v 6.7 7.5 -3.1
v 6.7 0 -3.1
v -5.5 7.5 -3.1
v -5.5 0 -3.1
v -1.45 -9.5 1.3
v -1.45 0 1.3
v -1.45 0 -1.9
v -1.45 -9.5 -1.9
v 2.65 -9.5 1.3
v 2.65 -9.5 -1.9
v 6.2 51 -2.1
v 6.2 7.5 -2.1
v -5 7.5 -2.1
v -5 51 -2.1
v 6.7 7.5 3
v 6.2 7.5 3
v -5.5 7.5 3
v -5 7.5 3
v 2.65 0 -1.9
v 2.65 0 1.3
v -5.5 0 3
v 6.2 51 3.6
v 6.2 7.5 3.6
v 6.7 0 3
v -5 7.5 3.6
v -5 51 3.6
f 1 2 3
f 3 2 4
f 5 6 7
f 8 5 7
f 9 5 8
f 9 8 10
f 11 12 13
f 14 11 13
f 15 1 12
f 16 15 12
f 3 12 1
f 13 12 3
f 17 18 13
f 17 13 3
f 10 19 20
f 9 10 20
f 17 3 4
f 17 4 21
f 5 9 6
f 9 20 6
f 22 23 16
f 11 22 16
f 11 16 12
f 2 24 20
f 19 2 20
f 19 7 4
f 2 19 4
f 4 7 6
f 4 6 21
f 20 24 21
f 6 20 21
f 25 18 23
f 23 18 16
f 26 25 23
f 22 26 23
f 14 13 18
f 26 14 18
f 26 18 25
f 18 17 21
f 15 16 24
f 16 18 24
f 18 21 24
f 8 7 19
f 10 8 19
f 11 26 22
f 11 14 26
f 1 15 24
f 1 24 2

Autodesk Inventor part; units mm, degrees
ref_plane "YZ Plane" through (0, 0, 0) normal (1, 0, 0) x (0, 1, 0)
ref_plane "XZ Plane" through (0, 0, 0) normal (0, 1, 0) x (-1, 0, 0)
ref_plane "XY Plane" through (0, 0, 0) normal (0, 0, 1) x (1, 0, 0)
sketch "Sketch2" plane through (0, 0, 0) normal (0, 1, 0) x (-1, 0, 0)
  line L0 (0, 0) -> (5.5, 0)
  line L1 (5.5, 0) -> (5.5, 3)
  line L2 (5.5, 3) -> (0, 3)
  line L3 (0, 3) -> (0, 0)
  line L4 (5.5, 3) -> (-6.7, 3)
  line L5 (-6.7, 3) -> (-6.7, -3.1)
  line L6 (-6.7, -3.1) -> (5.5, -3.1)
  line L7 (5.5, -3.1) -> (5.5, 3)
  dimension "d0" = 5.5
  dimension "d1" = 3
  dimension "d2" = 12.2
  dimension "d3" = 6.1
extrude "Extrusion1" add sketch "Sketch2" along normal blind 7.5
sketch "Sketch3" plane through (0, 7.5, 0) normal (0, 1, 0) x (1, 0, 0)
  line L0 (6.2, 2.1) -> (-5, 2.1)
  line L1 (-5, 2.1) -> (-5, -3.6)
  line L2 (-5, -3.6) -> (6.2, -3.6)
  line L3 (6.2, -3.6) -> (6.2, 2.1)
  line L4 (6.7, 3.1) -> (-5.5, 3.1) projected
  line L5 (6.7, -3) -> (6.7, 3.1) projected
  point P0 (0, 0)
  dimension "d6" = 6.7
  dimension "d7" = 5.7
  dimension "d8" = 11.2
  dimension "d9" = 0.5
extrude "Extrusion2" add sketch "Sketch3" along normal blind 43.5
sketch "Sketch4" plane through (0, 0, 0) normal (0, -1, 0) x (1, 0, 0)
  line L0 (-1.45, -1.9) -> (2.65, -1.9)
  line L1 (2.65, -1.9) -> (2.65, 1.3)
  line L2 (2.65, 1.3) -> (-1.45, 1.3)
  line L3 (-1.45, 1.3) -> (-1.45, -1.9)
  line L4 (-5.5, 3) -> (6.7, 3) projected
  line L5 (-5.5, -3.1) -> (-5.5, 3) projected
  point P0 (0, 0)
  dimension "d12" = 3.2
  dimension "d13" = 4.1
  dimension "d14" = 1.7
  dimension "d15" = 4.05
extrude "Extrusion3" add sketch "Sketch4" along normal blind 9.5
properties part number "Battery_small"
